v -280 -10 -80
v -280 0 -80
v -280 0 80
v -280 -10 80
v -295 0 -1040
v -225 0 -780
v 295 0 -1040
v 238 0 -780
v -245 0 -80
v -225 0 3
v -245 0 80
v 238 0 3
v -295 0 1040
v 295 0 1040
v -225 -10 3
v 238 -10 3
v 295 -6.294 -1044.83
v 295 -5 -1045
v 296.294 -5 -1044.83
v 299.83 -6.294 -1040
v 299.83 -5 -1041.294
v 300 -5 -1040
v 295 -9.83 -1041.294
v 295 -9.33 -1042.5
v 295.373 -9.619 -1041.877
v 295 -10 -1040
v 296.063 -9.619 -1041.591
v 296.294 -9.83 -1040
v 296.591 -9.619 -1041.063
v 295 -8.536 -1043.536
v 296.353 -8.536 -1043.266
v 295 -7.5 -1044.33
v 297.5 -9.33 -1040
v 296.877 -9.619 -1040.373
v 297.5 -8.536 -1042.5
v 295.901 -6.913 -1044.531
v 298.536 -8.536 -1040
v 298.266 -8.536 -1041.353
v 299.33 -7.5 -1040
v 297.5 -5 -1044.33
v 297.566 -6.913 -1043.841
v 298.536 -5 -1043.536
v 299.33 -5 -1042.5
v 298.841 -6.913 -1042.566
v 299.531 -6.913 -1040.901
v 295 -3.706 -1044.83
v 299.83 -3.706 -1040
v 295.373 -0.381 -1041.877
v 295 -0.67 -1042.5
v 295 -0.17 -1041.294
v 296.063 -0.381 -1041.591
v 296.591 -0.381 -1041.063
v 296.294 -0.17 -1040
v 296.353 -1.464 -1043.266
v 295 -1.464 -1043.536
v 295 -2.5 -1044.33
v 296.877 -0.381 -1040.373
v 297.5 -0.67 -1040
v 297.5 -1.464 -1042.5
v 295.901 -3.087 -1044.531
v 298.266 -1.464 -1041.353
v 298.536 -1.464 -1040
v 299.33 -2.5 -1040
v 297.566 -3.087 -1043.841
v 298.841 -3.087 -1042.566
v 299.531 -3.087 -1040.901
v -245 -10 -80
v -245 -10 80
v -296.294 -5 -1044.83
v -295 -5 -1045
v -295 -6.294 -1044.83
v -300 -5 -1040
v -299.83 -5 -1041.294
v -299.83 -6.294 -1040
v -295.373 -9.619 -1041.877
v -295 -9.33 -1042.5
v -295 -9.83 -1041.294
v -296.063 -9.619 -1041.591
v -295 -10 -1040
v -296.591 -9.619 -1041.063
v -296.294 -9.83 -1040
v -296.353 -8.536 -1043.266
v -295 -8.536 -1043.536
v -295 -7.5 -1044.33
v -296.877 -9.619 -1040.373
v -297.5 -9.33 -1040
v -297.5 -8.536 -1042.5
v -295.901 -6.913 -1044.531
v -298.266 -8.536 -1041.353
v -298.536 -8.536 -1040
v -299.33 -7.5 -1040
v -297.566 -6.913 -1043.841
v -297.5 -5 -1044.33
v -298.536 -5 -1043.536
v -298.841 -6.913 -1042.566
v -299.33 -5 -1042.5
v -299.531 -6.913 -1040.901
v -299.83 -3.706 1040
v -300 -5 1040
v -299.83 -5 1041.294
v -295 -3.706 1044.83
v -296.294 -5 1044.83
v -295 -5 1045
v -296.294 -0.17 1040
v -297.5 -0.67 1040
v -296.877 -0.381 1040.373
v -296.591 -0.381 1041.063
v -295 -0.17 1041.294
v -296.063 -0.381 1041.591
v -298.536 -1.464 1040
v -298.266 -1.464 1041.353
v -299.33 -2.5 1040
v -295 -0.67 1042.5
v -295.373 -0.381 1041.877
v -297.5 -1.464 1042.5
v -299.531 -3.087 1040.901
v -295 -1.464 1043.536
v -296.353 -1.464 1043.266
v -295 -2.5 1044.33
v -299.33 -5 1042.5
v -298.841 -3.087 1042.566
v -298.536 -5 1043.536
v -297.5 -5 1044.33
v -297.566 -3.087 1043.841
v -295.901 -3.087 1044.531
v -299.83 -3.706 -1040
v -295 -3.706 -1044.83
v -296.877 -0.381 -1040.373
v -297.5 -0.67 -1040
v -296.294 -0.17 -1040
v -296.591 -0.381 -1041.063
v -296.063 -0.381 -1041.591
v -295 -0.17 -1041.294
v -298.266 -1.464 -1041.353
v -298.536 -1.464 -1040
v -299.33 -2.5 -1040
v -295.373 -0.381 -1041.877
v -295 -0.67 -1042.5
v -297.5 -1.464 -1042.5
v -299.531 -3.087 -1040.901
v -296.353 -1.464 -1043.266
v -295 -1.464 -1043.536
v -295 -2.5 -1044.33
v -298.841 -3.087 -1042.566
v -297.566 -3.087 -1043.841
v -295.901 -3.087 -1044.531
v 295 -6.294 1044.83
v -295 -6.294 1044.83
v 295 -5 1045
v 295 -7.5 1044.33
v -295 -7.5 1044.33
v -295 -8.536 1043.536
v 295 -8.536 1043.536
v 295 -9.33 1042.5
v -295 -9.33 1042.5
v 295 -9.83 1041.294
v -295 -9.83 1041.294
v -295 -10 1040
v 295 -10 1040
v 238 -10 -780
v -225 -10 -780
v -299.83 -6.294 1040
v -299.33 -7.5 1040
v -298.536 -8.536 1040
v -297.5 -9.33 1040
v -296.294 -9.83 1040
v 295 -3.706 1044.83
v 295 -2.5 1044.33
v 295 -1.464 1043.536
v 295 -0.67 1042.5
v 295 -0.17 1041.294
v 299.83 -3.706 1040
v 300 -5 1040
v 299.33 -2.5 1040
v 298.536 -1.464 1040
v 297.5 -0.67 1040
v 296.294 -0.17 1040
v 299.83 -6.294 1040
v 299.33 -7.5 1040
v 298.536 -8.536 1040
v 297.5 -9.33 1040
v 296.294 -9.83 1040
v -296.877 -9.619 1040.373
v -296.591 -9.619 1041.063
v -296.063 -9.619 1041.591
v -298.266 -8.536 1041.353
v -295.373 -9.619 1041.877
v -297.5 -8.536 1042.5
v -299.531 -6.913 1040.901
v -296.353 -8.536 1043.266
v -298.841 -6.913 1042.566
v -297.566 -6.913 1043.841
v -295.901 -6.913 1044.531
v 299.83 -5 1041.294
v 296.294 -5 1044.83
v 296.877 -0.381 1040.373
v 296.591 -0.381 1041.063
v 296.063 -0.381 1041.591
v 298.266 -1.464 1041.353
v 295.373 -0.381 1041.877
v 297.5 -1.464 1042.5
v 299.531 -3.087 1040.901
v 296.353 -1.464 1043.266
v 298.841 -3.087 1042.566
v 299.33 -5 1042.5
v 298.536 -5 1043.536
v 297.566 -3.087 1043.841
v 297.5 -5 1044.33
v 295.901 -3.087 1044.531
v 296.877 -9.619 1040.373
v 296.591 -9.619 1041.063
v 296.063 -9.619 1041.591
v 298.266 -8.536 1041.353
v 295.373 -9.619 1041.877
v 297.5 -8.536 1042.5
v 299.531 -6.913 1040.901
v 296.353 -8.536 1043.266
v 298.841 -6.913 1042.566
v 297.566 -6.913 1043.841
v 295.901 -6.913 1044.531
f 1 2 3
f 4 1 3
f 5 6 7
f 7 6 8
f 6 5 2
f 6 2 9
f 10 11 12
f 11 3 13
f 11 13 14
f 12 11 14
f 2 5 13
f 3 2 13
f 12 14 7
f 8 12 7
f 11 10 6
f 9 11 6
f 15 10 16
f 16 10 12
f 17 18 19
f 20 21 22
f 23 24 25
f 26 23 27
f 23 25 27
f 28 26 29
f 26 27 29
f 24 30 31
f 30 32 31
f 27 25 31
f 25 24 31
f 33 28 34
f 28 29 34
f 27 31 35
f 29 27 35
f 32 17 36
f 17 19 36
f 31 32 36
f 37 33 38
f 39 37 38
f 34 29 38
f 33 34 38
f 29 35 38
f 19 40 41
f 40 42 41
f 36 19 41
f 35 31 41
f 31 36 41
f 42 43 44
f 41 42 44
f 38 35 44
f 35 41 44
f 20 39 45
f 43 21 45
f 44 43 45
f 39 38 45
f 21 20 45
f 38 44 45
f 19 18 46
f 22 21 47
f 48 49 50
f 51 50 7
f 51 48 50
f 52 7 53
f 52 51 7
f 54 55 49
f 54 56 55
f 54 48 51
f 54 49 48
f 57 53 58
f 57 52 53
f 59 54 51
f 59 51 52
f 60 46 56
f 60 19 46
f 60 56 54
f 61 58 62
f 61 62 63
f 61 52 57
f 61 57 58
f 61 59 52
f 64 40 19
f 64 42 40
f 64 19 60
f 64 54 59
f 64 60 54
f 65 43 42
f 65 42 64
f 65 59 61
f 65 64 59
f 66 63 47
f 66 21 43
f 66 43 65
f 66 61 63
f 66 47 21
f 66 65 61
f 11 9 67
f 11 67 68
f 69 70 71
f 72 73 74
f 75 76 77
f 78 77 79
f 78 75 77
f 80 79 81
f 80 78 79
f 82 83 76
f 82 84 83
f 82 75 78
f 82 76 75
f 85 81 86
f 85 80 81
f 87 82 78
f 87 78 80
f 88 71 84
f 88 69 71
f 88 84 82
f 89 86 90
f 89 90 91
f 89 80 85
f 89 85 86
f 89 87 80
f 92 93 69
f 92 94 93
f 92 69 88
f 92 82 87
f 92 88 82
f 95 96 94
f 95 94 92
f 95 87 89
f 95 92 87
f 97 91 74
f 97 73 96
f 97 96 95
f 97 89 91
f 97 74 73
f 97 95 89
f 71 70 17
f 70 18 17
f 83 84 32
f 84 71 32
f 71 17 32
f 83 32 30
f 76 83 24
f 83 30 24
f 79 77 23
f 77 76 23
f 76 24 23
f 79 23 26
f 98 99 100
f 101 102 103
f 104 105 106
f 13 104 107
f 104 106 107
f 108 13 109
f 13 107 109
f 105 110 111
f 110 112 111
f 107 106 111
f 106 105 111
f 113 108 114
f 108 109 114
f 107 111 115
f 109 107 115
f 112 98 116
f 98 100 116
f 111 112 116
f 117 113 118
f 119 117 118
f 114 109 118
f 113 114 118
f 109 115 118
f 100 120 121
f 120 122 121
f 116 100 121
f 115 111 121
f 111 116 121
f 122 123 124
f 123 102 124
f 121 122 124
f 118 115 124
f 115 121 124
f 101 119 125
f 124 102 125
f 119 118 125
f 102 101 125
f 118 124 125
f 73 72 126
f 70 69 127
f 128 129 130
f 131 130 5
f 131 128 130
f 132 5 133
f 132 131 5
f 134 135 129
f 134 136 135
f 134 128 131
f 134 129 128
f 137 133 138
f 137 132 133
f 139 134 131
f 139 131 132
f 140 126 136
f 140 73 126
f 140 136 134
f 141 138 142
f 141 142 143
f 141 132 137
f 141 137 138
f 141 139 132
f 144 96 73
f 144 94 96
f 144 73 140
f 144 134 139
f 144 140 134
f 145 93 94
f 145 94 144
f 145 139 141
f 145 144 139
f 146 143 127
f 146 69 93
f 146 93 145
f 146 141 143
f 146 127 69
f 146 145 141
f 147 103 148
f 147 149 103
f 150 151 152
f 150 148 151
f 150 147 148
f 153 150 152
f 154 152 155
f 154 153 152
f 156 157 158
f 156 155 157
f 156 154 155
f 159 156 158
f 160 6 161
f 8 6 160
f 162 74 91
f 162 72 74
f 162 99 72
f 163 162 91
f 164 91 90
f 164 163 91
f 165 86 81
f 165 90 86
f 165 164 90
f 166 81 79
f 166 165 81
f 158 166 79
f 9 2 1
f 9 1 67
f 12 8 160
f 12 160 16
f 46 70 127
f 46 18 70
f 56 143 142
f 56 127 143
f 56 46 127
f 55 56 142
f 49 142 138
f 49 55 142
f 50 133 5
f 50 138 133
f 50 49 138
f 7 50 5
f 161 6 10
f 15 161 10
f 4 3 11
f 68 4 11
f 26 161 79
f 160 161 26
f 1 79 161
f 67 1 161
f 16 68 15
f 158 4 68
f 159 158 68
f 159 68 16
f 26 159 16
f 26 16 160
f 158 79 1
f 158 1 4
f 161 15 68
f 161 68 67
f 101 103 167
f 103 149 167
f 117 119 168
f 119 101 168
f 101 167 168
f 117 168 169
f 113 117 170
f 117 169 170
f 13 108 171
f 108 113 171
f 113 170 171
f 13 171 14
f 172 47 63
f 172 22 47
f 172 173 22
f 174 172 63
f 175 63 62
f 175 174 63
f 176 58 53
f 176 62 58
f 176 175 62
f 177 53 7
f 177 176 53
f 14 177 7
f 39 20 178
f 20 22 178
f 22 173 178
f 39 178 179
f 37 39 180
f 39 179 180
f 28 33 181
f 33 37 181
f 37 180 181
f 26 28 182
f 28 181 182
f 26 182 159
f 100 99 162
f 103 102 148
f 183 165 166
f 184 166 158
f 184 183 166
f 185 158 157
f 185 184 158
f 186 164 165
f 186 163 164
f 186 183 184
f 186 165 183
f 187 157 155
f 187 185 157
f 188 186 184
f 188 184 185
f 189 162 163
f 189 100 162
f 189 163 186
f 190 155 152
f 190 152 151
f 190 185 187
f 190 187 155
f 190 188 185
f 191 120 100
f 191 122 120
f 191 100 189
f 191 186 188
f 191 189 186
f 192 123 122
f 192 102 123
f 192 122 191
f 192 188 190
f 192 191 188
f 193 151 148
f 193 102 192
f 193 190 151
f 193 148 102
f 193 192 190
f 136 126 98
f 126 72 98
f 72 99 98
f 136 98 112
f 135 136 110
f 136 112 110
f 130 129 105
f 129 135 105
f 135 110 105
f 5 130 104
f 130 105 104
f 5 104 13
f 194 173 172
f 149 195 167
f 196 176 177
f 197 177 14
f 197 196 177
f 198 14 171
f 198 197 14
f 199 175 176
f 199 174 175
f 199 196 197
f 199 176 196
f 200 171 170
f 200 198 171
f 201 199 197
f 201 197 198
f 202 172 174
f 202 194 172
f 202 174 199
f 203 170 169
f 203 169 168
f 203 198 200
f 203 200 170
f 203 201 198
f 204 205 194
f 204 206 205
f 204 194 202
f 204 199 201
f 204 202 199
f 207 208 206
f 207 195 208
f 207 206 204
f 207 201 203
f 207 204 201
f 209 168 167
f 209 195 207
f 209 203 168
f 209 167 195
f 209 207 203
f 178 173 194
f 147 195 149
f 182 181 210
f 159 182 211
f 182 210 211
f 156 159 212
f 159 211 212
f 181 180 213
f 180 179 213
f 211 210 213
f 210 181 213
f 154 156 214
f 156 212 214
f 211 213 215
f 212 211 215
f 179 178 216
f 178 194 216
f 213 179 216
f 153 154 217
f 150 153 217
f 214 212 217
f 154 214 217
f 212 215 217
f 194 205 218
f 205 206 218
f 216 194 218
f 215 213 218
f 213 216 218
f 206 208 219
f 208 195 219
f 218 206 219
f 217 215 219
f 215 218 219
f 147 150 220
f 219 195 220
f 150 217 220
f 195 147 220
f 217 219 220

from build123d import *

# Parameters (mm, degrees)
F0_W     = 600
F0_H     = 2090
F0_W_2   = 463
F0_H_2   = 783
F0_W_3   = 35
F0_H_3   = 160
F1_DEPTH = 10
F2_R     = 4.99999


# Not quite as in the source:
# - a fillet or chamfer is up to 0.001 mm smaller than in the source, because OpenCascade refuses the exact size


with BuildPart() as f1:
    # F0 (on Front) → F1 (new body)
    with BuildSketch(Plane.XZ):
        Rectangle(F0_W, F0_H)
        with Locations((6.5, -388.5)):
            Rectangle(F0_W_2, F0_H_2, mode=Mode.SUBTRACT)
        with Locations((-262.5, 0)):
            Rectangle(F0_W_3, F0_H_3, mode=Mode.SUBTRACT)
    extrude(amount=F1_DEPTH)

    # F2 (radius 5 in the source; OpenCascade refuses exactly that, so slightly less here)
    f2_edges = [f1.edges().sort_by_distance(p)[0] for p in [
        (300, -5, 1045),
        (-300, -5, 1045),
        (-300, -5, -1045),
        (300, -5, -1045),
        (0, -10, -1045),
        (-300, -10, 0),
        (-300, 0, 0),
        (0, 0, -1045),
        (300, 0, 0),
        (300, -10, 0),
        (0, -10, 1045),
        (0, 0, 1045),
    ]]
    fillet(f2_edges, radius=F2_R)


solid = f1.part
